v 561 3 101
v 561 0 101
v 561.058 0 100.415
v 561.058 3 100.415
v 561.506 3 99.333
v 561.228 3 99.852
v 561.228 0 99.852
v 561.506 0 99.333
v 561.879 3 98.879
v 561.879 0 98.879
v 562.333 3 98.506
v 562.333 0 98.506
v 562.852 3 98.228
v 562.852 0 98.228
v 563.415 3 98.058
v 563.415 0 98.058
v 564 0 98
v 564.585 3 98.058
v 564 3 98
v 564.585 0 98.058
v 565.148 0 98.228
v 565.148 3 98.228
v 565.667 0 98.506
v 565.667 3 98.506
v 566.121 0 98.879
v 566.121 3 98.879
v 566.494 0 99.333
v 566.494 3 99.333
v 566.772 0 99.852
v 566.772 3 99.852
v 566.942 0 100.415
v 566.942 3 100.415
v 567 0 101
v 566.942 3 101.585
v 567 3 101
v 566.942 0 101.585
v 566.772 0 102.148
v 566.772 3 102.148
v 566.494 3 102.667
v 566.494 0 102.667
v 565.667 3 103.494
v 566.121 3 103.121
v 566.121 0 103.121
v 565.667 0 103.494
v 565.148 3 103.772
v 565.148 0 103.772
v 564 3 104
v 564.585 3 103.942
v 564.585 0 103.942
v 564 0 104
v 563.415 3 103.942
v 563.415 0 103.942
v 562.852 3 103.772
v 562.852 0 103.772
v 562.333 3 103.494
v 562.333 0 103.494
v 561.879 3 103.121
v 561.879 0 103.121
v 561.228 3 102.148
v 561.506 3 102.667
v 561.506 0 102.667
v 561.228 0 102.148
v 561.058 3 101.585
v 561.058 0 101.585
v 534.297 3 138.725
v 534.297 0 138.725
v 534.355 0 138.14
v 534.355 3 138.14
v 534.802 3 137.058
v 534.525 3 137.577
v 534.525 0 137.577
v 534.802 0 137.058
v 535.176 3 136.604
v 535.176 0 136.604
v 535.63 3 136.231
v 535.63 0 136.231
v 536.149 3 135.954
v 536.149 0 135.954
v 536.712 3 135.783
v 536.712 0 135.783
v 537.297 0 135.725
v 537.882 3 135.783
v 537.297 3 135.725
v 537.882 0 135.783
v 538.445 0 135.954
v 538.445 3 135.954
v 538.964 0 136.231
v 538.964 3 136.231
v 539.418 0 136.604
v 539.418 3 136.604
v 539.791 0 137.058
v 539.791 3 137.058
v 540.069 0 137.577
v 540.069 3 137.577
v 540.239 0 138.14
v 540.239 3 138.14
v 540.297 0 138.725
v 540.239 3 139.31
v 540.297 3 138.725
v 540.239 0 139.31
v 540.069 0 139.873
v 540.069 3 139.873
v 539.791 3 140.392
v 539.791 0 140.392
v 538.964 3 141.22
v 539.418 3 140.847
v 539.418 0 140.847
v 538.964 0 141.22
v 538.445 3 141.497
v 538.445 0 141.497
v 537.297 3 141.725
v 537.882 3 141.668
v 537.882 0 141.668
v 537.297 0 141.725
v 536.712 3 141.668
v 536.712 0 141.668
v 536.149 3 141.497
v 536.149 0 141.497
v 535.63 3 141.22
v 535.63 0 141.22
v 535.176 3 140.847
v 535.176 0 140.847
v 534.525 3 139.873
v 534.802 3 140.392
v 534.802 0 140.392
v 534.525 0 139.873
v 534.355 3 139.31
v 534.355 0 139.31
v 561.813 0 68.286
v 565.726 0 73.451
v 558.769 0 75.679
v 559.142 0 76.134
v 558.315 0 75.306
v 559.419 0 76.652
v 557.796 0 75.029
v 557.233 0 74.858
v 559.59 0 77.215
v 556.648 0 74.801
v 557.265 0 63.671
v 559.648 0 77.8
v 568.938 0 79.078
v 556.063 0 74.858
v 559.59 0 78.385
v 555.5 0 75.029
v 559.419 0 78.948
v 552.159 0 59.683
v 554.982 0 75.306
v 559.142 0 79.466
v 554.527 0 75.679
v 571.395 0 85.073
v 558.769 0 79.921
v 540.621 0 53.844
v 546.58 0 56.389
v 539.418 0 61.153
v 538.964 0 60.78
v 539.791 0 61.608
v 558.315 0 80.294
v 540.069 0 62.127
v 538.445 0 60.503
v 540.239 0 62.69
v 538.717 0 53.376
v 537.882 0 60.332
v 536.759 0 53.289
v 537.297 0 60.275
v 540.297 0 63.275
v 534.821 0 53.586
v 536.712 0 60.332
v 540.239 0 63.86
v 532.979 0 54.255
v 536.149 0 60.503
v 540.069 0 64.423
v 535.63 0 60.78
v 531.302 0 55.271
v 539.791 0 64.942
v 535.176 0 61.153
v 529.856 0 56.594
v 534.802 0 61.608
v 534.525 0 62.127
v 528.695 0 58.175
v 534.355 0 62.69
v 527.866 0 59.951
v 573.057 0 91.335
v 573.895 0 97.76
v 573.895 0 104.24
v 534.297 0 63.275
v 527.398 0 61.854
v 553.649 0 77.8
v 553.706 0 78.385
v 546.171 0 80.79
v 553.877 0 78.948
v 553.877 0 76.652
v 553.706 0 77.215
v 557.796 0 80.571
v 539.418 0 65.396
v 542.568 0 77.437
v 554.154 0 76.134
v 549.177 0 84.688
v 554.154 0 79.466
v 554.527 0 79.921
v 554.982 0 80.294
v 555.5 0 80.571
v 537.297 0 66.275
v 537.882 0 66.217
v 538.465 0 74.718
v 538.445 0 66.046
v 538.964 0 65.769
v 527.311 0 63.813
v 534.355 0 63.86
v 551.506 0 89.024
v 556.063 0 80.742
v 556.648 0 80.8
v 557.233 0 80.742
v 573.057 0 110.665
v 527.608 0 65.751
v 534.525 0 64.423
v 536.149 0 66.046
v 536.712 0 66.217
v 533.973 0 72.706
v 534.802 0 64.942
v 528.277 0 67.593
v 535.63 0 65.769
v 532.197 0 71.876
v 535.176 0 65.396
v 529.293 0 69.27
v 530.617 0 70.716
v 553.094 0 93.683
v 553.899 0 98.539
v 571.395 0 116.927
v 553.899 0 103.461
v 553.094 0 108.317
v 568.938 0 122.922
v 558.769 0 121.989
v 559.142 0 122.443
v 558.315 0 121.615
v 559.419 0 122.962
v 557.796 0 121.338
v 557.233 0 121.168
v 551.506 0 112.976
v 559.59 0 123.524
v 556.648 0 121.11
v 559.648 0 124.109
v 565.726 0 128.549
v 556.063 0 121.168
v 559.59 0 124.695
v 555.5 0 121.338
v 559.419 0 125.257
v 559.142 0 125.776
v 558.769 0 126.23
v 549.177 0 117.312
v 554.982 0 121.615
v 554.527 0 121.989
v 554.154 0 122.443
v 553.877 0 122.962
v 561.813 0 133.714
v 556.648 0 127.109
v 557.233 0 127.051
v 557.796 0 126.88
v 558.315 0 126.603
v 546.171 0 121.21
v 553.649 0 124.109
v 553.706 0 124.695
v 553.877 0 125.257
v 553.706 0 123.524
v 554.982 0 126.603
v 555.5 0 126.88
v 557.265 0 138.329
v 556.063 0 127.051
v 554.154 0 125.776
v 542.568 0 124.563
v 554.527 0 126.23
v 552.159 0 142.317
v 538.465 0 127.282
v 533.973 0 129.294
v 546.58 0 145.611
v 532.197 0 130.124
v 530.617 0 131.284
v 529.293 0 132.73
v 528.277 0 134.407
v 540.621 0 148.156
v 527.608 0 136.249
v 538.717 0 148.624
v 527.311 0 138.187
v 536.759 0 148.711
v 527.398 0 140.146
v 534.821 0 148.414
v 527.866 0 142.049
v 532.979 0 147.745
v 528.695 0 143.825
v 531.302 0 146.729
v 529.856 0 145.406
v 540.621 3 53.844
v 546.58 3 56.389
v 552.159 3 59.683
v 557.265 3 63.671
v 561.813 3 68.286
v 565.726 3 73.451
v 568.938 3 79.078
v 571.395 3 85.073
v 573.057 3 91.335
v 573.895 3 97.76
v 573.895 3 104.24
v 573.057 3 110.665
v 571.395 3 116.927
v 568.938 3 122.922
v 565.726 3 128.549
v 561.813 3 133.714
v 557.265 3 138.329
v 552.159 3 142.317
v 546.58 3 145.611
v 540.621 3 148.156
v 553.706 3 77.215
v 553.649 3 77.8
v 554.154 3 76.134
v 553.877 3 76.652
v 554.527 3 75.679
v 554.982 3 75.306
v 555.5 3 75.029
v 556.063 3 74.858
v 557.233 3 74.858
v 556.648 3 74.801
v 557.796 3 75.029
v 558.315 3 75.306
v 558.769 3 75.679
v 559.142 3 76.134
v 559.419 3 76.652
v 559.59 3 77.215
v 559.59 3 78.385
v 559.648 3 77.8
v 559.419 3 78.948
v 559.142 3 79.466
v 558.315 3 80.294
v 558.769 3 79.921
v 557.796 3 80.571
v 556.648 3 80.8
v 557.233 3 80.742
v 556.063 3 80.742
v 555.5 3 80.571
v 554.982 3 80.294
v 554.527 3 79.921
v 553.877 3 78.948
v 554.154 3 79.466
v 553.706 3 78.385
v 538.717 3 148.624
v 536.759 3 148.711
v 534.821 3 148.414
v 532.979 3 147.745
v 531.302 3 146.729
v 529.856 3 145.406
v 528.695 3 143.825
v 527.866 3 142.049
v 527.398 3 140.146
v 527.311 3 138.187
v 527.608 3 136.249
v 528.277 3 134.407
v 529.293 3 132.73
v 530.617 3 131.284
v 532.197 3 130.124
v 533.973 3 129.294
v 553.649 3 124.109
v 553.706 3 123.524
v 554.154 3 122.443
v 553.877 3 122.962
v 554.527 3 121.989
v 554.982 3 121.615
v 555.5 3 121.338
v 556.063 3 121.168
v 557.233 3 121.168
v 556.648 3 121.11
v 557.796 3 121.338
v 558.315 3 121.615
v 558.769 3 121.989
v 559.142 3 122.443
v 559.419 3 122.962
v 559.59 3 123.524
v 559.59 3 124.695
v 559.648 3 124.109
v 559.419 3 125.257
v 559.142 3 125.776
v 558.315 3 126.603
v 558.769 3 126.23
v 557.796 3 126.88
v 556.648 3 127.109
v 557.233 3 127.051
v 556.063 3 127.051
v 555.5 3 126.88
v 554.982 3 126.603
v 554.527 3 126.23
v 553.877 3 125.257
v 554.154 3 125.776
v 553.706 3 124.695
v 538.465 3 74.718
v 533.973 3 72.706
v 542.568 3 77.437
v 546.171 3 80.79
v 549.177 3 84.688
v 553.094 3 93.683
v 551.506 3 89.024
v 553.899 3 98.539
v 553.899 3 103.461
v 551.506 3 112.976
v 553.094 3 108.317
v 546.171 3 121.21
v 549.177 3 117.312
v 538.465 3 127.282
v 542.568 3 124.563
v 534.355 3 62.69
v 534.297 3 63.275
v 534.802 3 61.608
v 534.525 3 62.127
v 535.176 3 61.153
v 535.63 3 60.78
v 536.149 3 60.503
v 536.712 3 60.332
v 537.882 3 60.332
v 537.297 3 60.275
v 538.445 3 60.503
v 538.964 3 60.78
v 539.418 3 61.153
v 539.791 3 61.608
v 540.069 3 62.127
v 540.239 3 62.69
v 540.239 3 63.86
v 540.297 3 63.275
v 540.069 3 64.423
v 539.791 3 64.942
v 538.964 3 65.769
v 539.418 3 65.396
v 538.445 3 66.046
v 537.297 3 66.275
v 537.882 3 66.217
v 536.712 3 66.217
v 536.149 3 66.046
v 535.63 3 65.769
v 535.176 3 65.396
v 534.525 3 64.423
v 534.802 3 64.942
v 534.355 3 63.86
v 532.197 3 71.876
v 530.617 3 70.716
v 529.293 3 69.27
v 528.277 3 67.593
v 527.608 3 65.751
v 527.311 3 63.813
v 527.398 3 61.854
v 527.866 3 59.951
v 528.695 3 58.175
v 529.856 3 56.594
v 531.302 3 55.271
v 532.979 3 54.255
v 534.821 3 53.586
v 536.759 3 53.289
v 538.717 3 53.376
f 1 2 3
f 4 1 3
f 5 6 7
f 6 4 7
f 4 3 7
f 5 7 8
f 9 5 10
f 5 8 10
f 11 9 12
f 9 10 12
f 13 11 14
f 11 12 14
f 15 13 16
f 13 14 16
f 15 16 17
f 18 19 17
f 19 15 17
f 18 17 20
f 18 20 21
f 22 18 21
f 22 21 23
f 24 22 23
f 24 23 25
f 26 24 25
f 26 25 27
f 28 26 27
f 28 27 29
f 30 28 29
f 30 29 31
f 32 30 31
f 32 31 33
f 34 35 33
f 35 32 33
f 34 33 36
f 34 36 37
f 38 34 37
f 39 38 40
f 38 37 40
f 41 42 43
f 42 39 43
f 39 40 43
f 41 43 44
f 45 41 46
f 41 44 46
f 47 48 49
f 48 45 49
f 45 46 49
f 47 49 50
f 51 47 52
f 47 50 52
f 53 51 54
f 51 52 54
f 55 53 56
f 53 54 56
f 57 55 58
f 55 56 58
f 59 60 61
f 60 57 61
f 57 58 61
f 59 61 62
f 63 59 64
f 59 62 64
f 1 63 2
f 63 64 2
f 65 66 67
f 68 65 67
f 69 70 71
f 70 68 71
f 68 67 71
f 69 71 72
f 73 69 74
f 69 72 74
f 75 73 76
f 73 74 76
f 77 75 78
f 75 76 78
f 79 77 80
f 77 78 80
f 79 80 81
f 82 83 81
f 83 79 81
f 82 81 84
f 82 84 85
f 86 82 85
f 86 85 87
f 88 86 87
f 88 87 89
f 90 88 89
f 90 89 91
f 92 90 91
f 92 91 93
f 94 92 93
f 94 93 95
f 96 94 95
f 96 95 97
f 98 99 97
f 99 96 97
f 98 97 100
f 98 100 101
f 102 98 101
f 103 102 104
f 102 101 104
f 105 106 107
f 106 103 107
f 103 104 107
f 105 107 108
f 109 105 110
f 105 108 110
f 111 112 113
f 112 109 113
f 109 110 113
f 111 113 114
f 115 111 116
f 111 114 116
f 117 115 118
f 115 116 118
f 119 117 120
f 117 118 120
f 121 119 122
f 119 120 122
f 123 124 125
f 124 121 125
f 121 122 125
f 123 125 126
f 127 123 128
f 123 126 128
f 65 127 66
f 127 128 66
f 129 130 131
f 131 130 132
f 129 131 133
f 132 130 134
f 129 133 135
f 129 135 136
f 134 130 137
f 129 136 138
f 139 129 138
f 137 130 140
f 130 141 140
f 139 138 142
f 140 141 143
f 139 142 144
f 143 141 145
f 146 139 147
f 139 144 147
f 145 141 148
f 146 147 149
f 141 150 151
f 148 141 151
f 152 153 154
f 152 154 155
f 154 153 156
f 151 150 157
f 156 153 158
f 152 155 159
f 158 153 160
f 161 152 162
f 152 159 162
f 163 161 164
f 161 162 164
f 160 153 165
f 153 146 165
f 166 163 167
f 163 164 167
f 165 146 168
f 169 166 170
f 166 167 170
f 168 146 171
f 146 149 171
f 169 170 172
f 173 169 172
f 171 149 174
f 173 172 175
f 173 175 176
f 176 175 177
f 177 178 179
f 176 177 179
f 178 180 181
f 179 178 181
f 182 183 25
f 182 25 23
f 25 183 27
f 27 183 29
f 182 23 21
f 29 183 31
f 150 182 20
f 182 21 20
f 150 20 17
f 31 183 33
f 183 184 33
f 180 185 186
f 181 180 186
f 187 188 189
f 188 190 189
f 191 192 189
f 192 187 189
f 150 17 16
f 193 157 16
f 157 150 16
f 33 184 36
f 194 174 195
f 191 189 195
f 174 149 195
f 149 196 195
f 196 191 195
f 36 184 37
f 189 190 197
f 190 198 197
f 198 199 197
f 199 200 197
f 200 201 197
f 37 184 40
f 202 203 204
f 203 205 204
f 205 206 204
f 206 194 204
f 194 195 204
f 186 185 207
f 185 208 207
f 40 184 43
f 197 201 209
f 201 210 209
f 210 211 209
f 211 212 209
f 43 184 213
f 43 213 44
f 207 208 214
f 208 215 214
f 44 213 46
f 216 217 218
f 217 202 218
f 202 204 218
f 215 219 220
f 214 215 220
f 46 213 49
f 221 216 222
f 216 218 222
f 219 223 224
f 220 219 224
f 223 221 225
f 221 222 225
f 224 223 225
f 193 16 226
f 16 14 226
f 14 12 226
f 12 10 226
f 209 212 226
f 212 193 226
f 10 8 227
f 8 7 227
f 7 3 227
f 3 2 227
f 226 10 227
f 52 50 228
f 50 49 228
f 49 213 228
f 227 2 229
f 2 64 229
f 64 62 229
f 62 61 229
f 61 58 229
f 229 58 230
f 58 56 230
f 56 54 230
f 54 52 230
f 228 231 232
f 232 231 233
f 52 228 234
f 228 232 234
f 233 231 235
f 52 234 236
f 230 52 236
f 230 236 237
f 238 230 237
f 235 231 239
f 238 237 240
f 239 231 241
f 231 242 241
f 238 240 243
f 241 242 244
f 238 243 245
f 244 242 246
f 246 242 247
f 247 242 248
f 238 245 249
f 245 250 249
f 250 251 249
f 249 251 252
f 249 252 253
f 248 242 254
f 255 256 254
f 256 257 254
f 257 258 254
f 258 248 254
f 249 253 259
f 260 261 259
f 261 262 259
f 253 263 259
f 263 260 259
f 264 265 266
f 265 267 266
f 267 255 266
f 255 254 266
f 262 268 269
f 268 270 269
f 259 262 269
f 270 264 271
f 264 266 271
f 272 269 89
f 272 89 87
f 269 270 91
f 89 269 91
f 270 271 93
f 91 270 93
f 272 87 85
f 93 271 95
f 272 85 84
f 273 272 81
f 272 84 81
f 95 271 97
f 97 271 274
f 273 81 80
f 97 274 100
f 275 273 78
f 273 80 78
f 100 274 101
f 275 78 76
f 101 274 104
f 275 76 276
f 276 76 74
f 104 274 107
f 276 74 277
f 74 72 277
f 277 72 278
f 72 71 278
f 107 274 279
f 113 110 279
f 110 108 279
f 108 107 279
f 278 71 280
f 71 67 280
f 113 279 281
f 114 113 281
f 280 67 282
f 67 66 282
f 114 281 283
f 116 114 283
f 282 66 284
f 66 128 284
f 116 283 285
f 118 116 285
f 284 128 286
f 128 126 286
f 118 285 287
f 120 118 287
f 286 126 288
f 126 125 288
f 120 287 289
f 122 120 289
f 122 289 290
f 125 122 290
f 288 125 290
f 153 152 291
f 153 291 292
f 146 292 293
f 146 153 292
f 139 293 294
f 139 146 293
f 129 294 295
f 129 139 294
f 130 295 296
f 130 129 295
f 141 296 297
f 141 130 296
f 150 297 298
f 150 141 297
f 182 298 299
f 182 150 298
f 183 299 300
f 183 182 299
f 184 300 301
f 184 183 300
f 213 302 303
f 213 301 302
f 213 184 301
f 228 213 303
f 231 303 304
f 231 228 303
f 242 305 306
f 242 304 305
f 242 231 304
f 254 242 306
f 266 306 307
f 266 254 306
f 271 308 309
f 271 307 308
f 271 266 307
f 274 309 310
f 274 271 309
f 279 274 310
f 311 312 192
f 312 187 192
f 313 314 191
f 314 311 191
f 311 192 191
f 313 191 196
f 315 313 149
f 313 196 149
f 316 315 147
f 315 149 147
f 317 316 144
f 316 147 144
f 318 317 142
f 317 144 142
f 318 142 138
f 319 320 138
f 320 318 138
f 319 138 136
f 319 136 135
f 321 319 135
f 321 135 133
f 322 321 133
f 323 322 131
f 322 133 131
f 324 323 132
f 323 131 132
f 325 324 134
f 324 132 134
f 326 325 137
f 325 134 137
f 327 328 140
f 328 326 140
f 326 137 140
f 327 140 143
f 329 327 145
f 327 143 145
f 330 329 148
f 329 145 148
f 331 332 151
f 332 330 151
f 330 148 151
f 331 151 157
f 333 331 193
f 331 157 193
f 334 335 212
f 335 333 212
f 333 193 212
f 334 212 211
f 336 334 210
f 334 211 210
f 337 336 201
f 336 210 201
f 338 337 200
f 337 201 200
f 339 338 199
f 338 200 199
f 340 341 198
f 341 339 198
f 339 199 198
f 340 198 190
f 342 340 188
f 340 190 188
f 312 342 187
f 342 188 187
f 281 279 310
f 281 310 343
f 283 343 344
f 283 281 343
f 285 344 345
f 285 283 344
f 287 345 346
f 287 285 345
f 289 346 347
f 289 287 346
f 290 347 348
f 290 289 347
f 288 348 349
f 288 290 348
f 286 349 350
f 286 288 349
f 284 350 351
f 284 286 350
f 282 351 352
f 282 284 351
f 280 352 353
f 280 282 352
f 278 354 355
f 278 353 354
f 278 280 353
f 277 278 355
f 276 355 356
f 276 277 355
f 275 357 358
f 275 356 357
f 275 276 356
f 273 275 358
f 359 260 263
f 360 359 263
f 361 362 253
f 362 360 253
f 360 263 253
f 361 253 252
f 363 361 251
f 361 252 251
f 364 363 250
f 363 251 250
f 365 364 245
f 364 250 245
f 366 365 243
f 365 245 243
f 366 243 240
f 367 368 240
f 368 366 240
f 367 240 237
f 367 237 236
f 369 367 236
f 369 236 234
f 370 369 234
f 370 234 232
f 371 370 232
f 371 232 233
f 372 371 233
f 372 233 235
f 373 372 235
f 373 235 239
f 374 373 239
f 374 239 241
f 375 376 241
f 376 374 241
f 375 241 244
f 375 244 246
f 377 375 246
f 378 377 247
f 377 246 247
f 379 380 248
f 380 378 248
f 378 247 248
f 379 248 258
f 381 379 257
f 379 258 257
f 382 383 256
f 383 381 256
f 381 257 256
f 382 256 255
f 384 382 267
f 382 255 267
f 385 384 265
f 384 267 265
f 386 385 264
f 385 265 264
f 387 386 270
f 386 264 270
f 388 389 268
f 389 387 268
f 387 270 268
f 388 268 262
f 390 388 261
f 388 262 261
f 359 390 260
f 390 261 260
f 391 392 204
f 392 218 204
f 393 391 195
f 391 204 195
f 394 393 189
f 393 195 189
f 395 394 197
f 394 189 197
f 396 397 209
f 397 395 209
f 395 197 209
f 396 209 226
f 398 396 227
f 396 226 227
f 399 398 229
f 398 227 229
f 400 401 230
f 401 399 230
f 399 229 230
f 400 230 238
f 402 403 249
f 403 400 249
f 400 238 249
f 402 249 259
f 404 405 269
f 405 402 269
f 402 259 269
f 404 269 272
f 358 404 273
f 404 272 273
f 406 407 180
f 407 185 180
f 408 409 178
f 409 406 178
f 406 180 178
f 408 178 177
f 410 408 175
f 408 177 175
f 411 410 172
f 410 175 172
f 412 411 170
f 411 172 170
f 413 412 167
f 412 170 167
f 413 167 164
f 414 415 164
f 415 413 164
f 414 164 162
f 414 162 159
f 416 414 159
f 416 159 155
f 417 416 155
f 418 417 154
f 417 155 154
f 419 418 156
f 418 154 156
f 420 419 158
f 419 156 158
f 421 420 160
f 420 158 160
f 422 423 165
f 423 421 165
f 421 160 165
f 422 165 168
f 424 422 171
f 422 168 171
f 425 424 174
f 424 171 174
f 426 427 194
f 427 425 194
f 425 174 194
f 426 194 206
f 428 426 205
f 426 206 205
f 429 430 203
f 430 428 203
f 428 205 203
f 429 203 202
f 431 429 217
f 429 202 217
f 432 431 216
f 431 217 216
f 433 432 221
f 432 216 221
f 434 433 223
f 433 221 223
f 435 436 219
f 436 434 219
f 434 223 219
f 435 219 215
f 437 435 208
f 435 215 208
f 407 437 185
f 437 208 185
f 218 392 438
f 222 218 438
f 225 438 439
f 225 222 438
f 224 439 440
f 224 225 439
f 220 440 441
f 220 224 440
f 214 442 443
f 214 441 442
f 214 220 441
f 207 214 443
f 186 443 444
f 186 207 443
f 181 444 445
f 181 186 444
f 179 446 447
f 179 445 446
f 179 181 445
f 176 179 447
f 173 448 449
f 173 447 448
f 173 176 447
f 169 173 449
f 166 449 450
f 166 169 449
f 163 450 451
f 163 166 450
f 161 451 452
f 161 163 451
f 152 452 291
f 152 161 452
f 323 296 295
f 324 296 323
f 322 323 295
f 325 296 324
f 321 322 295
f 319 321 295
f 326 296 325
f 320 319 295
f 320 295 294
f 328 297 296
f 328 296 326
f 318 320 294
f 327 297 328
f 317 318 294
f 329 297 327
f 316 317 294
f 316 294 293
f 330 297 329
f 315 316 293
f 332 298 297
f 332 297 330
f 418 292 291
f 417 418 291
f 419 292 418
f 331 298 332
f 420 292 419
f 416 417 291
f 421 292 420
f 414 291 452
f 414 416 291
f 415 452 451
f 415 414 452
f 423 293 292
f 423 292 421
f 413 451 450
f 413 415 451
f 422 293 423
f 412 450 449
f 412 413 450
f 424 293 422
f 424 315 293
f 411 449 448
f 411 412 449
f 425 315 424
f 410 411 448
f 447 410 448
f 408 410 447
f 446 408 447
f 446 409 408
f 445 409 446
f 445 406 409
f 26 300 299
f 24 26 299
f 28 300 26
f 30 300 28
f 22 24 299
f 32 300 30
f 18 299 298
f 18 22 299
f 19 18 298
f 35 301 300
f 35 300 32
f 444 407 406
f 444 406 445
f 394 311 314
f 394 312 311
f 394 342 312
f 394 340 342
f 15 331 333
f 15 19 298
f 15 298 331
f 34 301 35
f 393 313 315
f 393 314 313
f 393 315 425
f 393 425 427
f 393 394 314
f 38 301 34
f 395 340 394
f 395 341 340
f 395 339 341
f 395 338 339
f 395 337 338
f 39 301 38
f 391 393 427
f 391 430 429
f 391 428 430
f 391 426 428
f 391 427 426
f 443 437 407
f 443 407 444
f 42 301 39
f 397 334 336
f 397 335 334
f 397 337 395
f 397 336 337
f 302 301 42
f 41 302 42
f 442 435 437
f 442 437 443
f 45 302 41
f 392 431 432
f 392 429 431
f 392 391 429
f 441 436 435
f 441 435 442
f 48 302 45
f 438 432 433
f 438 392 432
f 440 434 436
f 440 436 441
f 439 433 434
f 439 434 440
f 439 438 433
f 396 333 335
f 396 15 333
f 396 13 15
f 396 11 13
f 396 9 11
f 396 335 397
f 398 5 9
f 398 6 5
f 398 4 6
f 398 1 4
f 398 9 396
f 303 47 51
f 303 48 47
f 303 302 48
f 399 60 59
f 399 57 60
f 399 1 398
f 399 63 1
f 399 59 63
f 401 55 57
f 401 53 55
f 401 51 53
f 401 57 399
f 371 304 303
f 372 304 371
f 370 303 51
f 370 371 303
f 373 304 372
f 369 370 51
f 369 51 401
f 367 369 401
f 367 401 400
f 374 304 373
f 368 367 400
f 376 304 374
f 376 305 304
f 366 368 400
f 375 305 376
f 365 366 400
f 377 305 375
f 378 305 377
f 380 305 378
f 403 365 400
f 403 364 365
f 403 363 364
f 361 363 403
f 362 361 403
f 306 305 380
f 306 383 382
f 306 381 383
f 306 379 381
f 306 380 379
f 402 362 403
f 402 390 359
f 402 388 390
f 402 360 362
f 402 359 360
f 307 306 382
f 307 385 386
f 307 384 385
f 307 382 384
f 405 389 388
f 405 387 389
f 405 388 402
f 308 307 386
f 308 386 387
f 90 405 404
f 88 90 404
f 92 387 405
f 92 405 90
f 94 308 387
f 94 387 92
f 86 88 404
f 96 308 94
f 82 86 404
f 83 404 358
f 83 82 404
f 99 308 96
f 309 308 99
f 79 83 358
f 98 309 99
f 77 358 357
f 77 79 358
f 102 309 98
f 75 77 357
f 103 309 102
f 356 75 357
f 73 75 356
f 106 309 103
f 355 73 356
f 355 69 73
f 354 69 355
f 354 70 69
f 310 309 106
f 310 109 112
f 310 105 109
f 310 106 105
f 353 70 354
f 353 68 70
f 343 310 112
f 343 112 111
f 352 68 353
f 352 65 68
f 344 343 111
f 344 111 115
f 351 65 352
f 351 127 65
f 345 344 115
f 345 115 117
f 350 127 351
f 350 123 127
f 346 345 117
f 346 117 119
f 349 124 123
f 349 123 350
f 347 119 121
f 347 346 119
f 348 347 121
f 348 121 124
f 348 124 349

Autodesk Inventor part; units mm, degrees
ref_plane "YZ Plane" through (0, 0, 0) normal (1, 0, 0) x (0, 1, 0)
ref_plane "XZ Plane" through (0, 0, 0) normal (0, 1, 0) x (-1, 0, 0)
ref_plane "XY Plane" through (0, 0, 0) normal (0, 0, 1) x (1, 0, 0)
sketch3d "3D Sketch1"
sketch "Sketch8" plane through (0, 0, 0) normal (0, 1, 0) x (-1, 0, 0)
  arc A0 (-533.9727, 129.2939) -> (-533.9727, 72.7061) centre (-524, 101) ccw projected
  arc A1 (-533.9727, 129.2939) -> (-540.6211, 148.1565) centre (-537.2969, 138.7252) ccw projected
  arc A2 (-540.6211, 148.1565) -> (-540.6211, 53.8435) centre (-524, 101) ccw projected
  arc A3 (-540.6211, 53.8435) -> (-533.9727, 72.7061) centre (-537.2969, 63.2748) ccw projected
  circle A4 centre (-537.2969, 63.2748) radius 3 projected
  circle A5 centre (-556.6482, 77.8001) radius 2.9994 projected
  circle A6 centre (-564, 101) radius 3 projected
  circle A7 centre (-556.6482, 124.1094) radius 2.9994 projected
  circle A8 centre (-537.2969, 138.7252) radius 3 projected
  point P0 (0, 0)
extrude "Extrusion1" add sketch "Sketch8" along normal blind 3
properties part number "pulsador_presion"
